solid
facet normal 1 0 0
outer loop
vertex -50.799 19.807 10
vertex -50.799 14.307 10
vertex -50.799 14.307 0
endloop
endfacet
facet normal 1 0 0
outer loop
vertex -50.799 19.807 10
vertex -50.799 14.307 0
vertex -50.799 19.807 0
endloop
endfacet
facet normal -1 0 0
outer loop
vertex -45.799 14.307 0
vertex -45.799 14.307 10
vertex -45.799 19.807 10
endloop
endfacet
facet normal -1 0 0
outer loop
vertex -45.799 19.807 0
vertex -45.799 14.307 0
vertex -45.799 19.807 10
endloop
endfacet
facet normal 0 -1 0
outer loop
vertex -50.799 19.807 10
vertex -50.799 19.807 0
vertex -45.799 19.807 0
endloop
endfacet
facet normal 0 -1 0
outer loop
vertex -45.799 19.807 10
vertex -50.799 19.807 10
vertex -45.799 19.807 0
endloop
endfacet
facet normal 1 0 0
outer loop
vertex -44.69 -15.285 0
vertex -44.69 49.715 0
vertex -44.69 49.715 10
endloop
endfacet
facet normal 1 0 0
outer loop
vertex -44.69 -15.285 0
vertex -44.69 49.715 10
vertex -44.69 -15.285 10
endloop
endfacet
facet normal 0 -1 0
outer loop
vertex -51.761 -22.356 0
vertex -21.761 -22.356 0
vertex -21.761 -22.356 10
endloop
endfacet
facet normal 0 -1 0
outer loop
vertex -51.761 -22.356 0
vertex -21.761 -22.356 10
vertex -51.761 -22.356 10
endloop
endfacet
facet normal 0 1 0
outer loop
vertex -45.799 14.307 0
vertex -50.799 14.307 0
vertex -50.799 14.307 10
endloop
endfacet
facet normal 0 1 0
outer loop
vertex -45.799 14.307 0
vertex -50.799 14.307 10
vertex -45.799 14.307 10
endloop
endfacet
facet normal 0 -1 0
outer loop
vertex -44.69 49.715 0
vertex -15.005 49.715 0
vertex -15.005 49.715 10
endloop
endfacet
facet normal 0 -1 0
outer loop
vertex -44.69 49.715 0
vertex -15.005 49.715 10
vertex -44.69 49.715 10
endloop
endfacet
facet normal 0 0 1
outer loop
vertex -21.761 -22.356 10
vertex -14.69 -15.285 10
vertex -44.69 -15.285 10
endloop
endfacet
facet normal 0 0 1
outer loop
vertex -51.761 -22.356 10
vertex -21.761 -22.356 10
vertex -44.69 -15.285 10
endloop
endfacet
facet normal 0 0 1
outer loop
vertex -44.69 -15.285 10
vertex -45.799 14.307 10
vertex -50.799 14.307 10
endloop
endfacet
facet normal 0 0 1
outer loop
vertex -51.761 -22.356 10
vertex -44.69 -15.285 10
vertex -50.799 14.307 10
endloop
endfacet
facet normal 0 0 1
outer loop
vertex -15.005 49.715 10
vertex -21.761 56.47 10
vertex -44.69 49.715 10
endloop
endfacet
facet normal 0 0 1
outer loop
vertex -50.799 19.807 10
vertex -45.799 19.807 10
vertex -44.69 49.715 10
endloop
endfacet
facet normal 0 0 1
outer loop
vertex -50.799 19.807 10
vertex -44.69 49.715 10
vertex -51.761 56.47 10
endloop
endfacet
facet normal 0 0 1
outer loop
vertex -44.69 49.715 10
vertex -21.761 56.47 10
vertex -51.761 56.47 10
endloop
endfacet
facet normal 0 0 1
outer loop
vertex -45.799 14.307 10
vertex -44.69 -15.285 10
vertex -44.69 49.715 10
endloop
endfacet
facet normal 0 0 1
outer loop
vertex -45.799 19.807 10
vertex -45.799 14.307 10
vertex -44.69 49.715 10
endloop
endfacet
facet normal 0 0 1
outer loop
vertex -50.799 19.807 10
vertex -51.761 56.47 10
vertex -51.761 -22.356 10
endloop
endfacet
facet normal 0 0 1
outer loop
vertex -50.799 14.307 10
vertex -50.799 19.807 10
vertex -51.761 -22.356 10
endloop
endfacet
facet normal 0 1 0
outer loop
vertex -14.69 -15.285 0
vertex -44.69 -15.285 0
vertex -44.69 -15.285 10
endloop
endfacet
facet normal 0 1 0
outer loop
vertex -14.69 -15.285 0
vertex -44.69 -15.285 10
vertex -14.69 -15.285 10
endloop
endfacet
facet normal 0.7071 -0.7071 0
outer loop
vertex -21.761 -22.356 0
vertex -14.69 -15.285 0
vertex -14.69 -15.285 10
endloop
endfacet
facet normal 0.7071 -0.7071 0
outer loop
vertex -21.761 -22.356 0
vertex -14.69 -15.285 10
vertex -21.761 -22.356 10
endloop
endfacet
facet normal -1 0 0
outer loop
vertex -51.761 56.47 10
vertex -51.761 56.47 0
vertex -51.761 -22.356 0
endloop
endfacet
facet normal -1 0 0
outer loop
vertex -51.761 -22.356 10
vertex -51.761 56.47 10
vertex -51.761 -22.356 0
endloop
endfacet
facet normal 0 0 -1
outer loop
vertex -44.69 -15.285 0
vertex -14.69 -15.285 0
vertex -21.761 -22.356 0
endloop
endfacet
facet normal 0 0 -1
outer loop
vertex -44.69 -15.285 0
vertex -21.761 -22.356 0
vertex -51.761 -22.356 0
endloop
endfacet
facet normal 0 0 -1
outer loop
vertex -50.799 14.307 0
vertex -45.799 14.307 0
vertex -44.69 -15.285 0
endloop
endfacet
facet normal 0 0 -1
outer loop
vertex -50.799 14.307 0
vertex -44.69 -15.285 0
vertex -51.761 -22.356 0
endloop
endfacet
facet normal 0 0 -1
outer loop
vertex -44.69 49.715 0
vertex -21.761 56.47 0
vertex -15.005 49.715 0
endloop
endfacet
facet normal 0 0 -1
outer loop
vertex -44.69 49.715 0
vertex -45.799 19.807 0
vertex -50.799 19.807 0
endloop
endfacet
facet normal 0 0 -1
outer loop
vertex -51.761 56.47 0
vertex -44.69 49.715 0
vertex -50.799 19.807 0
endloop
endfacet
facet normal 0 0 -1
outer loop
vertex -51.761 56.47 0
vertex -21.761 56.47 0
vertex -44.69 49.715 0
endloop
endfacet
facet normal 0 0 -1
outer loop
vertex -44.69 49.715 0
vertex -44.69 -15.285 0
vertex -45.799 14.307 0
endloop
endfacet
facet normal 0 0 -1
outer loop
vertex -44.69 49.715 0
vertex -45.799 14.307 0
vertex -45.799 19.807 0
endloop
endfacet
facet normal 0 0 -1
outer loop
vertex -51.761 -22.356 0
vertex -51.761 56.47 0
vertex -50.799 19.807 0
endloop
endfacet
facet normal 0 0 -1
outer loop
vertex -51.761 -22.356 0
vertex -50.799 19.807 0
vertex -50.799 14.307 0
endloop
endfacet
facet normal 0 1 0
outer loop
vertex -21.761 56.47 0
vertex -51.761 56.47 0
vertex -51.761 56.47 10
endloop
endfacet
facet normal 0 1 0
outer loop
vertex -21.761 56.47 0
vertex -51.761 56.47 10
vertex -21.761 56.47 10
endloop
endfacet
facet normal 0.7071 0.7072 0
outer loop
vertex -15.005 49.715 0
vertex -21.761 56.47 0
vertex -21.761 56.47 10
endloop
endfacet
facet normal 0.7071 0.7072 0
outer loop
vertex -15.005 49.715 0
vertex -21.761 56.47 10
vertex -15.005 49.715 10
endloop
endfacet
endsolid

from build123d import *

# Parameters (mm, degrees)
BOSS_EXTRUDE1_DEPTH     = 10
SKETCH2_W               = 5
SKETCH2_H               = 5.5
CUT_EXTRUDE2_DEPTH      = 11
CUT_EXTRUDE2_DEPTH_BACK = 10


with BuildPart() as part:
    # Sketch1 → Boss-Extrude1 (new body)
    with BuildSketch(Plane.XY):
        Polygon((-15.00519424, 49.714572154), (-44.689605678, 49.714572154), (-44.689605678, -15.285427846), (-14.689605678, -15.285427846), (-21.76067349, -22.356495658), (-51.76067349, -22.356495658), (-51.76067349, -18.214360034), (-51.76067349, 56.470051403), (-21.76067349, 56.470051403), align=None)
    extrude(amount=BOSS_EXTRUDE1_DEPTH)

    # Sketch2 → Cut-Extrude2 (cut, two sides)
    with BuildSketch(Plane.XY) as cut_extrude2_sk:
        with Locations((-48.298710813, 17.056777872)):
            Rectangle(SKETCH2_W, SKETCH2_H)
    extrude(amount=CUT_EXTRUDE2_DEPTH, mode=Mode.SUBTRACT)
    extrude(cut_extrude2_sk.sketch, amount=-CUT_EXTRUDE2_DEPTH_BACK, mode=Mode.SUBTRACT)


solid = part.part
